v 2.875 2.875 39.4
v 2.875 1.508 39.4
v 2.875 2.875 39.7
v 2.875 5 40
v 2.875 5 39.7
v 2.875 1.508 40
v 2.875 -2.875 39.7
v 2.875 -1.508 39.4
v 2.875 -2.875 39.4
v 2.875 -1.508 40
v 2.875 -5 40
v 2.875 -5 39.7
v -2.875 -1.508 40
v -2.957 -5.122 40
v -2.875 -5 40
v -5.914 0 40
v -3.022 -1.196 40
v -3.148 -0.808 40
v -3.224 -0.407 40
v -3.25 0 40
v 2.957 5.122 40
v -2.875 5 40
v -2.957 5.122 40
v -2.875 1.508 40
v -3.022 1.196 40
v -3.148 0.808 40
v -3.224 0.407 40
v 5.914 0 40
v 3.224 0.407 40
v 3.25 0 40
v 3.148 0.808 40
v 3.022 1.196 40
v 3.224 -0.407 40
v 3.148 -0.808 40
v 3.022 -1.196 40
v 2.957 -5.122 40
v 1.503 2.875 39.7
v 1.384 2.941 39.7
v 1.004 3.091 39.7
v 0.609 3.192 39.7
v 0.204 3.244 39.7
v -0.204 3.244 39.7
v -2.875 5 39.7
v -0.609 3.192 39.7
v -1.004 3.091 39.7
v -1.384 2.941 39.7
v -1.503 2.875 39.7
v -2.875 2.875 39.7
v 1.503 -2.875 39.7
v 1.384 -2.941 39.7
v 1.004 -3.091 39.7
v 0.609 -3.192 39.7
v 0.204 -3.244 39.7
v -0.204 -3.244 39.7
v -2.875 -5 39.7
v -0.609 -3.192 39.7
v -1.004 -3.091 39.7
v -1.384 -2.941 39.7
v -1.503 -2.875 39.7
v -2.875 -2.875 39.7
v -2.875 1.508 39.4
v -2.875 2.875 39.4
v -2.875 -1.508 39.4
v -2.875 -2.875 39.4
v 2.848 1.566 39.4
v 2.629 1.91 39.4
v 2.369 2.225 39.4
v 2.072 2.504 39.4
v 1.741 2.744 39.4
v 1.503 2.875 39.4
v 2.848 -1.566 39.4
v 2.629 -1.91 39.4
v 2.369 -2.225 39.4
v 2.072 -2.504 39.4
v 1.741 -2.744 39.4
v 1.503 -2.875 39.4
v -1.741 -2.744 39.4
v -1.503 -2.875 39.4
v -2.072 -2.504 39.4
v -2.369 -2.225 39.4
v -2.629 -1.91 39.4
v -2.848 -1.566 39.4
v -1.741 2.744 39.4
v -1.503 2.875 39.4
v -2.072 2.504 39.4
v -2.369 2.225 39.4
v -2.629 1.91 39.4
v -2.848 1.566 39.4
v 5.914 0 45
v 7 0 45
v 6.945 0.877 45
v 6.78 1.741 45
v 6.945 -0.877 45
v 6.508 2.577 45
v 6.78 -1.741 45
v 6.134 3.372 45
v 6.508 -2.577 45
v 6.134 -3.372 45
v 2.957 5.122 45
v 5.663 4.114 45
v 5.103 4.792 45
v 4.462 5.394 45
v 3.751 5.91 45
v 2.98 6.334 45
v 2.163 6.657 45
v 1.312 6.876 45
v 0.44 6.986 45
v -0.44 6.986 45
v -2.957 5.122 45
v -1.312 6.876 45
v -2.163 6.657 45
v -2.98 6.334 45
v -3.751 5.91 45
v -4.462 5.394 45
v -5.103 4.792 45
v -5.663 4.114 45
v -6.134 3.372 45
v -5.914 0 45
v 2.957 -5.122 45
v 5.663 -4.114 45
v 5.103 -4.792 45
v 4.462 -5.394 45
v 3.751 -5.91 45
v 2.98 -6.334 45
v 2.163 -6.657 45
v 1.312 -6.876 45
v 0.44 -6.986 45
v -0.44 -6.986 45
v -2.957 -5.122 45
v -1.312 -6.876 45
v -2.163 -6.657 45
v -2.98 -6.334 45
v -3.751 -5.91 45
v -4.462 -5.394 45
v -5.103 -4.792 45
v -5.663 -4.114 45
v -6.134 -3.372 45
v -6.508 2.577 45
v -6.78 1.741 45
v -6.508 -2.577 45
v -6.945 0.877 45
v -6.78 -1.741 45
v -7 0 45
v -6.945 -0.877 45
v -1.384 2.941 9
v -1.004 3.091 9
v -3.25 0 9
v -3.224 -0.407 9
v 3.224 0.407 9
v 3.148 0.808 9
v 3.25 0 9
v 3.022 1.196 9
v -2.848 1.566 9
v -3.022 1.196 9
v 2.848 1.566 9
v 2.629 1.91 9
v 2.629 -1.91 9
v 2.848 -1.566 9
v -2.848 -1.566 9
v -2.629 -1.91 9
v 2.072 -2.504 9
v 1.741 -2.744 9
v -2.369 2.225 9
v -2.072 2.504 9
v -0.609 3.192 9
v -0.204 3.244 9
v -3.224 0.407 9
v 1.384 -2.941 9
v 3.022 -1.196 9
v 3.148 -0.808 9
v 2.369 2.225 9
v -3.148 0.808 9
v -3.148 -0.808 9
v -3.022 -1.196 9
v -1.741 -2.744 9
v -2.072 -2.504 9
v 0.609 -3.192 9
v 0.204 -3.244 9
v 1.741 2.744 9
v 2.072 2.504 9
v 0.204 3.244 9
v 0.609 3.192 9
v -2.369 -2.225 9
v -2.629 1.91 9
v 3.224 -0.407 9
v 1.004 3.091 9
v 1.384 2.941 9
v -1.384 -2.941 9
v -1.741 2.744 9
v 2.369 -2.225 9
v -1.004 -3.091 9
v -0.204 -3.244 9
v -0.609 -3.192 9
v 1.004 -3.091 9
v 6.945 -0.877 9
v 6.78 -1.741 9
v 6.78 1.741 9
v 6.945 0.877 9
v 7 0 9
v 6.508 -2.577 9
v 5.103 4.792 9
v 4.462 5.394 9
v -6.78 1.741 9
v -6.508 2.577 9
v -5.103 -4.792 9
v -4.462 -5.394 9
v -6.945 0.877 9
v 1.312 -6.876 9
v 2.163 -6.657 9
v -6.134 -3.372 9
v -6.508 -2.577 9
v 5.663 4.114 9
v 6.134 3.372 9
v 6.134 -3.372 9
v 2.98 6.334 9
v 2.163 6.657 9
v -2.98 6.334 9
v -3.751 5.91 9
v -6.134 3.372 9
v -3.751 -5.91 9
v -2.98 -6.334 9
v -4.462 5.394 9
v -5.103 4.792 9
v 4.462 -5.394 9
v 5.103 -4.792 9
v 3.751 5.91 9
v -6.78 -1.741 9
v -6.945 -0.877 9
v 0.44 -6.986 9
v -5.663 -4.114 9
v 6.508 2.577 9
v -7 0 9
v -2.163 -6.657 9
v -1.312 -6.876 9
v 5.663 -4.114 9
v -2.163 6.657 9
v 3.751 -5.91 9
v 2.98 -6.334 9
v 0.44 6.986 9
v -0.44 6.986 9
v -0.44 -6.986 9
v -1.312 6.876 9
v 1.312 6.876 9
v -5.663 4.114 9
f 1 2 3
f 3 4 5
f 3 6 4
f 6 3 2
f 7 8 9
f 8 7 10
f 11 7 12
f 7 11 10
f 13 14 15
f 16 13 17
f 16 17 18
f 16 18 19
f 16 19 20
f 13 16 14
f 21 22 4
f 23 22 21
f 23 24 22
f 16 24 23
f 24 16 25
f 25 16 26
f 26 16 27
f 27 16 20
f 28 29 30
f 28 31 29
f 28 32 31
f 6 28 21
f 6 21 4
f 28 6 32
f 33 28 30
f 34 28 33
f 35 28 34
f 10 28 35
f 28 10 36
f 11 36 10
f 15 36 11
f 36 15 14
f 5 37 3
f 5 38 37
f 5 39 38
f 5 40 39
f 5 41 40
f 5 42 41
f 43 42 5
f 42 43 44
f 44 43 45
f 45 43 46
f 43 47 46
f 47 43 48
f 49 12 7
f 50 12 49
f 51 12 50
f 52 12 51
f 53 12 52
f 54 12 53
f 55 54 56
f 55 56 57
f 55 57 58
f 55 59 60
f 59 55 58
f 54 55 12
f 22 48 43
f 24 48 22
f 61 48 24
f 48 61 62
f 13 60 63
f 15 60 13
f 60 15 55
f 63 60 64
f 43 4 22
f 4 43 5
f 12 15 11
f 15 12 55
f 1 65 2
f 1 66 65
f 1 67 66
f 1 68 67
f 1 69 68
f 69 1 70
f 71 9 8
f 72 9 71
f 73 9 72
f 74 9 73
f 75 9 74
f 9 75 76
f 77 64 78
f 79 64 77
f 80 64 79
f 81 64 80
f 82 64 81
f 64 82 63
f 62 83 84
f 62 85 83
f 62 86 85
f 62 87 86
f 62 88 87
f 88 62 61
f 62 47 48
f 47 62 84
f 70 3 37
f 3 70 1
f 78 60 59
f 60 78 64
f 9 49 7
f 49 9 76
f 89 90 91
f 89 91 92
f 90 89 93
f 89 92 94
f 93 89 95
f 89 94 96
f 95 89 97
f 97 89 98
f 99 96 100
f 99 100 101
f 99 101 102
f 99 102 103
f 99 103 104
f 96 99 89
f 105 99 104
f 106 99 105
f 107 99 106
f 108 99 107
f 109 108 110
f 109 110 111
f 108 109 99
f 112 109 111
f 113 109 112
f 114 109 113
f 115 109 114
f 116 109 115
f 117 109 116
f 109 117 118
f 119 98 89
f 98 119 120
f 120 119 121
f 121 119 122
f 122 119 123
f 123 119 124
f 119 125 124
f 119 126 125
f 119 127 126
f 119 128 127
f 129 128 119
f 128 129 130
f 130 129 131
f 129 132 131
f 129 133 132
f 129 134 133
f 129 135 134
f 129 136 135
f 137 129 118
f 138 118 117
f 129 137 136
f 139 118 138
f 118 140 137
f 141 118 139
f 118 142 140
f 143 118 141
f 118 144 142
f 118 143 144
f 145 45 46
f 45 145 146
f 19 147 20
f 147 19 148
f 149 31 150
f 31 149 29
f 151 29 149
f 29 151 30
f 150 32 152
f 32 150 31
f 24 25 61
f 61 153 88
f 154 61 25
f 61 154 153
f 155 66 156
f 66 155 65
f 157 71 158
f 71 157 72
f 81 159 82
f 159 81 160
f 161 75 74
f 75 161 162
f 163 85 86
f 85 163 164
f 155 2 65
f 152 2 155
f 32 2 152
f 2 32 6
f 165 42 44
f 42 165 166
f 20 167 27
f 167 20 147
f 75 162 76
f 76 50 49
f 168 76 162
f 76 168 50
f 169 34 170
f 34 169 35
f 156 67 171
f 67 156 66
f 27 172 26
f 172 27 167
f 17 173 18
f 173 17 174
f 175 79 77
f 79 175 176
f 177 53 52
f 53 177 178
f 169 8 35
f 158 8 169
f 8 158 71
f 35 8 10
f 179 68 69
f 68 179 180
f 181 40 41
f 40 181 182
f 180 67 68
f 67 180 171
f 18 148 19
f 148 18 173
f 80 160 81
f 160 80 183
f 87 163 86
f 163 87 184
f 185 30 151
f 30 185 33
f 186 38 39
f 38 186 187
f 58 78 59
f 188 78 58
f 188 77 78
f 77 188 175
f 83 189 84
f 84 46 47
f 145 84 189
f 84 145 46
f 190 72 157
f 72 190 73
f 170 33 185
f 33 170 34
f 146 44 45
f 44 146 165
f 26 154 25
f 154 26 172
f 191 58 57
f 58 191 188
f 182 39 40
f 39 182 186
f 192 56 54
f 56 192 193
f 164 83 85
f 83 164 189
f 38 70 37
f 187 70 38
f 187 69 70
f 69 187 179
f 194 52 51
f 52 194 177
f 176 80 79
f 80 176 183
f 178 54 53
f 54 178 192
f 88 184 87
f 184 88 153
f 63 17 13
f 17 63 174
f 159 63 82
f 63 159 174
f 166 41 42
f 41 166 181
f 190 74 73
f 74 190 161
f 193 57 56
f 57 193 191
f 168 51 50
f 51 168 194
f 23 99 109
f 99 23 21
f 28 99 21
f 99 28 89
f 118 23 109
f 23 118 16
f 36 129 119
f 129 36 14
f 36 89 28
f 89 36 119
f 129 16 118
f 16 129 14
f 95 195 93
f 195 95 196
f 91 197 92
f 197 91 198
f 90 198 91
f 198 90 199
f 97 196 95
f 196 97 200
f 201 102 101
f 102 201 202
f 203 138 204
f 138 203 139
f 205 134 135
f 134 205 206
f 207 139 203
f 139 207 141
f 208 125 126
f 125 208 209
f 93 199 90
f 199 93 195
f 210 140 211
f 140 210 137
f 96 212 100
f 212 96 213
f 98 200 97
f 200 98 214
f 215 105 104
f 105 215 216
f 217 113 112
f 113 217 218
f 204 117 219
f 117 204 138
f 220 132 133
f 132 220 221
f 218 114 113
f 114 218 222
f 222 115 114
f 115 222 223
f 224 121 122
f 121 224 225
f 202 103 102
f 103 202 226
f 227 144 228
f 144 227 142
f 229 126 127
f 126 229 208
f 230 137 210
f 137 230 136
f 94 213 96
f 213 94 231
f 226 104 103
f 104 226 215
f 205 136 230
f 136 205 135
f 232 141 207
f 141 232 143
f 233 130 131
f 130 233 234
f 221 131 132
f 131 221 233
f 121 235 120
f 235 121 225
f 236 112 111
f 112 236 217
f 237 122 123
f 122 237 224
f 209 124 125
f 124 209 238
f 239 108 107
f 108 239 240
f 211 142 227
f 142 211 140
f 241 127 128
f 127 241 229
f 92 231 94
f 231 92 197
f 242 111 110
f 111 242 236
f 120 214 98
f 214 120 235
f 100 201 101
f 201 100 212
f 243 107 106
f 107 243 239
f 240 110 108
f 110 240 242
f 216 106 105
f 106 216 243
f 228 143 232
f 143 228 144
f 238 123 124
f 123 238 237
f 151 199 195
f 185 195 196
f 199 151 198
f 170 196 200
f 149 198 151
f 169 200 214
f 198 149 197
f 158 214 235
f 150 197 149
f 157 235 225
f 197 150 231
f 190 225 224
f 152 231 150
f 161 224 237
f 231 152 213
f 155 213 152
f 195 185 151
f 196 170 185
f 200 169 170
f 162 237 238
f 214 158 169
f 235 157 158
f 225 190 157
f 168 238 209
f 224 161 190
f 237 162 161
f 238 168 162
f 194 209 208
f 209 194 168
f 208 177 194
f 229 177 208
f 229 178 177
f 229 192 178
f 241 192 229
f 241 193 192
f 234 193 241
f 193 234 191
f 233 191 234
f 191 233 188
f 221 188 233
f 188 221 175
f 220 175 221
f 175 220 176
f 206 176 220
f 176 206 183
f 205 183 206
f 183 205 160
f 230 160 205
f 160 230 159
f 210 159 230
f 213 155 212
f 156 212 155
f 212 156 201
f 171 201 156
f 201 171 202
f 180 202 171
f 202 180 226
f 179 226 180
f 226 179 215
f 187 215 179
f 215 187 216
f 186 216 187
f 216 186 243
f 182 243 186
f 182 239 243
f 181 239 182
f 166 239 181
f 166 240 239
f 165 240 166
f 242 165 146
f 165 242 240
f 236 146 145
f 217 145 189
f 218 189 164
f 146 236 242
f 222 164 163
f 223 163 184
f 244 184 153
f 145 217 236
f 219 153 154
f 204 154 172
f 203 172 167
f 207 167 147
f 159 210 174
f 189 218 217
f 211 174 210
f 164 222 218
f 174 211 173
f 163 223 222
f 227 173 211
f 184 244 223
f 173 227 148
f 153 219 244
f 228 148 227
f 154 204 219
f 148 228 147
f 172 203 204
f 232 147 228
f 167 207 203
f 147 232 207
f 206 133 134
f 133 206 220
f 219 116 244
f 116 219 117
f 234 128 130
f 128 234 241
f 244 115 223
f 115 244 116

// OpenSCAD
$fn = 50;


difference() {
	union() {
		translate(v = [0, 0, 9.0000000000]) {
			cylinder(h = 36, r = 7.0000000000);
		}
	}
	union() {
		translate(v = [0, 0, 45]) {
			rotate(a = [0, 0, 0]) {
				difference() {
					union() {
						#translate(v = [-2.8750000000, -5.0000000000, -5.3000000000]) {
							cube(size = [5.7500000000, 10, 0.3000000000]);
						}
						#translate(v = [-2.8750000000, -2.8750000000, -5.6000000000]) {
							cube(size = [5.7500000000, 5.7500000000, 0.3000000000]);
						}
						#translate(v = [-2.8750000000, -5.0000000000, 0]) {
							cube(size = [5.7500000000, 10, 0.3000000000]);
						}
						#translate(v = [-2.8750000000, -2.8750000000, 0.3000000000]) {
							cube(size = [5.7500000000, 5.7500000000, 0.3000000000]);
						}
						#translate(v = [0, 0, -100.0000000000]) {
							cylinder(h = 200, r = 3.2500000000);
						}
						translate(v = [0, 0, -5]) {
							#linear_extrude(height = 5) {
								polygon(points = [[5.9142500000, 0.0000000000], [2.9571250000, 5.1218907443], [-2.9571250000, 5.1218907443], [-5.9142500000, 0.0000000000], [-2.9571250000, -5.1218907443], [2.9571250000, -5.1218907443]]);
							}
						}
						#translate(v = [-2.8750000000, -5.0000000000, -5.3000000000]) {
							cube(size = [5.7500000000, 10, 0.3000000000]);
						}
						#translate(v = [-2.8750000000, -2.8750000000, -5.6000000000]) {
							cube(size = [5.7500000000, 5.7500000000, 0.3000000000]);
						}
						#translate(v = [-2.8750000000, -5.0000000000, 0]) {
							cube(size = [5.7500000000, 10, 0.3000000000]);
						}
						#translate(v = [-2.8750000000, -2.8750000000, 0.3000000000]) {
							cube(size = [5.7500000000, 5.7500000000, 0.3000000000]);
						}
						#translate(v = [0, 0, -100.0000000000]) {
							cylinder(h = 200, r = 3.2500000000);
						}
						#translate(v = [-2.8750000000, -5.0000000000, -5.3000000000]) {
							cube(size = [5.7500000000, 10, 0.3000000000]);
						}
						#translate(v = [-2.8750000000, -2.8750000000, -5.6000000000]) {
							cube(size = [5.7500000000, 5.7500000000, 0.3000000000]);
						}
						#translate(v = [-2.8750000000, -5.0000000000, 0]) {
							cube(size = [5.7500000000, 10, 0.3000000000]);
						}
						#translate(v = [-2.8750000000, -2.8750000000, 0.3000000000]) {
							cube(size = [5.7500000000, 5.7500000000, 0.3000000000]);
						}
						#translate(v = [0, 0, -100.0000000000]) {
							cylinder(h = 200, r = 3.2500000000);
						}
					}
					union();
				}
			}
		}
		#translate(v = [0, 0, -100.0000000000]) {
			cylinder(h = 200, r = 3.2500000000);
		}
	}
}
